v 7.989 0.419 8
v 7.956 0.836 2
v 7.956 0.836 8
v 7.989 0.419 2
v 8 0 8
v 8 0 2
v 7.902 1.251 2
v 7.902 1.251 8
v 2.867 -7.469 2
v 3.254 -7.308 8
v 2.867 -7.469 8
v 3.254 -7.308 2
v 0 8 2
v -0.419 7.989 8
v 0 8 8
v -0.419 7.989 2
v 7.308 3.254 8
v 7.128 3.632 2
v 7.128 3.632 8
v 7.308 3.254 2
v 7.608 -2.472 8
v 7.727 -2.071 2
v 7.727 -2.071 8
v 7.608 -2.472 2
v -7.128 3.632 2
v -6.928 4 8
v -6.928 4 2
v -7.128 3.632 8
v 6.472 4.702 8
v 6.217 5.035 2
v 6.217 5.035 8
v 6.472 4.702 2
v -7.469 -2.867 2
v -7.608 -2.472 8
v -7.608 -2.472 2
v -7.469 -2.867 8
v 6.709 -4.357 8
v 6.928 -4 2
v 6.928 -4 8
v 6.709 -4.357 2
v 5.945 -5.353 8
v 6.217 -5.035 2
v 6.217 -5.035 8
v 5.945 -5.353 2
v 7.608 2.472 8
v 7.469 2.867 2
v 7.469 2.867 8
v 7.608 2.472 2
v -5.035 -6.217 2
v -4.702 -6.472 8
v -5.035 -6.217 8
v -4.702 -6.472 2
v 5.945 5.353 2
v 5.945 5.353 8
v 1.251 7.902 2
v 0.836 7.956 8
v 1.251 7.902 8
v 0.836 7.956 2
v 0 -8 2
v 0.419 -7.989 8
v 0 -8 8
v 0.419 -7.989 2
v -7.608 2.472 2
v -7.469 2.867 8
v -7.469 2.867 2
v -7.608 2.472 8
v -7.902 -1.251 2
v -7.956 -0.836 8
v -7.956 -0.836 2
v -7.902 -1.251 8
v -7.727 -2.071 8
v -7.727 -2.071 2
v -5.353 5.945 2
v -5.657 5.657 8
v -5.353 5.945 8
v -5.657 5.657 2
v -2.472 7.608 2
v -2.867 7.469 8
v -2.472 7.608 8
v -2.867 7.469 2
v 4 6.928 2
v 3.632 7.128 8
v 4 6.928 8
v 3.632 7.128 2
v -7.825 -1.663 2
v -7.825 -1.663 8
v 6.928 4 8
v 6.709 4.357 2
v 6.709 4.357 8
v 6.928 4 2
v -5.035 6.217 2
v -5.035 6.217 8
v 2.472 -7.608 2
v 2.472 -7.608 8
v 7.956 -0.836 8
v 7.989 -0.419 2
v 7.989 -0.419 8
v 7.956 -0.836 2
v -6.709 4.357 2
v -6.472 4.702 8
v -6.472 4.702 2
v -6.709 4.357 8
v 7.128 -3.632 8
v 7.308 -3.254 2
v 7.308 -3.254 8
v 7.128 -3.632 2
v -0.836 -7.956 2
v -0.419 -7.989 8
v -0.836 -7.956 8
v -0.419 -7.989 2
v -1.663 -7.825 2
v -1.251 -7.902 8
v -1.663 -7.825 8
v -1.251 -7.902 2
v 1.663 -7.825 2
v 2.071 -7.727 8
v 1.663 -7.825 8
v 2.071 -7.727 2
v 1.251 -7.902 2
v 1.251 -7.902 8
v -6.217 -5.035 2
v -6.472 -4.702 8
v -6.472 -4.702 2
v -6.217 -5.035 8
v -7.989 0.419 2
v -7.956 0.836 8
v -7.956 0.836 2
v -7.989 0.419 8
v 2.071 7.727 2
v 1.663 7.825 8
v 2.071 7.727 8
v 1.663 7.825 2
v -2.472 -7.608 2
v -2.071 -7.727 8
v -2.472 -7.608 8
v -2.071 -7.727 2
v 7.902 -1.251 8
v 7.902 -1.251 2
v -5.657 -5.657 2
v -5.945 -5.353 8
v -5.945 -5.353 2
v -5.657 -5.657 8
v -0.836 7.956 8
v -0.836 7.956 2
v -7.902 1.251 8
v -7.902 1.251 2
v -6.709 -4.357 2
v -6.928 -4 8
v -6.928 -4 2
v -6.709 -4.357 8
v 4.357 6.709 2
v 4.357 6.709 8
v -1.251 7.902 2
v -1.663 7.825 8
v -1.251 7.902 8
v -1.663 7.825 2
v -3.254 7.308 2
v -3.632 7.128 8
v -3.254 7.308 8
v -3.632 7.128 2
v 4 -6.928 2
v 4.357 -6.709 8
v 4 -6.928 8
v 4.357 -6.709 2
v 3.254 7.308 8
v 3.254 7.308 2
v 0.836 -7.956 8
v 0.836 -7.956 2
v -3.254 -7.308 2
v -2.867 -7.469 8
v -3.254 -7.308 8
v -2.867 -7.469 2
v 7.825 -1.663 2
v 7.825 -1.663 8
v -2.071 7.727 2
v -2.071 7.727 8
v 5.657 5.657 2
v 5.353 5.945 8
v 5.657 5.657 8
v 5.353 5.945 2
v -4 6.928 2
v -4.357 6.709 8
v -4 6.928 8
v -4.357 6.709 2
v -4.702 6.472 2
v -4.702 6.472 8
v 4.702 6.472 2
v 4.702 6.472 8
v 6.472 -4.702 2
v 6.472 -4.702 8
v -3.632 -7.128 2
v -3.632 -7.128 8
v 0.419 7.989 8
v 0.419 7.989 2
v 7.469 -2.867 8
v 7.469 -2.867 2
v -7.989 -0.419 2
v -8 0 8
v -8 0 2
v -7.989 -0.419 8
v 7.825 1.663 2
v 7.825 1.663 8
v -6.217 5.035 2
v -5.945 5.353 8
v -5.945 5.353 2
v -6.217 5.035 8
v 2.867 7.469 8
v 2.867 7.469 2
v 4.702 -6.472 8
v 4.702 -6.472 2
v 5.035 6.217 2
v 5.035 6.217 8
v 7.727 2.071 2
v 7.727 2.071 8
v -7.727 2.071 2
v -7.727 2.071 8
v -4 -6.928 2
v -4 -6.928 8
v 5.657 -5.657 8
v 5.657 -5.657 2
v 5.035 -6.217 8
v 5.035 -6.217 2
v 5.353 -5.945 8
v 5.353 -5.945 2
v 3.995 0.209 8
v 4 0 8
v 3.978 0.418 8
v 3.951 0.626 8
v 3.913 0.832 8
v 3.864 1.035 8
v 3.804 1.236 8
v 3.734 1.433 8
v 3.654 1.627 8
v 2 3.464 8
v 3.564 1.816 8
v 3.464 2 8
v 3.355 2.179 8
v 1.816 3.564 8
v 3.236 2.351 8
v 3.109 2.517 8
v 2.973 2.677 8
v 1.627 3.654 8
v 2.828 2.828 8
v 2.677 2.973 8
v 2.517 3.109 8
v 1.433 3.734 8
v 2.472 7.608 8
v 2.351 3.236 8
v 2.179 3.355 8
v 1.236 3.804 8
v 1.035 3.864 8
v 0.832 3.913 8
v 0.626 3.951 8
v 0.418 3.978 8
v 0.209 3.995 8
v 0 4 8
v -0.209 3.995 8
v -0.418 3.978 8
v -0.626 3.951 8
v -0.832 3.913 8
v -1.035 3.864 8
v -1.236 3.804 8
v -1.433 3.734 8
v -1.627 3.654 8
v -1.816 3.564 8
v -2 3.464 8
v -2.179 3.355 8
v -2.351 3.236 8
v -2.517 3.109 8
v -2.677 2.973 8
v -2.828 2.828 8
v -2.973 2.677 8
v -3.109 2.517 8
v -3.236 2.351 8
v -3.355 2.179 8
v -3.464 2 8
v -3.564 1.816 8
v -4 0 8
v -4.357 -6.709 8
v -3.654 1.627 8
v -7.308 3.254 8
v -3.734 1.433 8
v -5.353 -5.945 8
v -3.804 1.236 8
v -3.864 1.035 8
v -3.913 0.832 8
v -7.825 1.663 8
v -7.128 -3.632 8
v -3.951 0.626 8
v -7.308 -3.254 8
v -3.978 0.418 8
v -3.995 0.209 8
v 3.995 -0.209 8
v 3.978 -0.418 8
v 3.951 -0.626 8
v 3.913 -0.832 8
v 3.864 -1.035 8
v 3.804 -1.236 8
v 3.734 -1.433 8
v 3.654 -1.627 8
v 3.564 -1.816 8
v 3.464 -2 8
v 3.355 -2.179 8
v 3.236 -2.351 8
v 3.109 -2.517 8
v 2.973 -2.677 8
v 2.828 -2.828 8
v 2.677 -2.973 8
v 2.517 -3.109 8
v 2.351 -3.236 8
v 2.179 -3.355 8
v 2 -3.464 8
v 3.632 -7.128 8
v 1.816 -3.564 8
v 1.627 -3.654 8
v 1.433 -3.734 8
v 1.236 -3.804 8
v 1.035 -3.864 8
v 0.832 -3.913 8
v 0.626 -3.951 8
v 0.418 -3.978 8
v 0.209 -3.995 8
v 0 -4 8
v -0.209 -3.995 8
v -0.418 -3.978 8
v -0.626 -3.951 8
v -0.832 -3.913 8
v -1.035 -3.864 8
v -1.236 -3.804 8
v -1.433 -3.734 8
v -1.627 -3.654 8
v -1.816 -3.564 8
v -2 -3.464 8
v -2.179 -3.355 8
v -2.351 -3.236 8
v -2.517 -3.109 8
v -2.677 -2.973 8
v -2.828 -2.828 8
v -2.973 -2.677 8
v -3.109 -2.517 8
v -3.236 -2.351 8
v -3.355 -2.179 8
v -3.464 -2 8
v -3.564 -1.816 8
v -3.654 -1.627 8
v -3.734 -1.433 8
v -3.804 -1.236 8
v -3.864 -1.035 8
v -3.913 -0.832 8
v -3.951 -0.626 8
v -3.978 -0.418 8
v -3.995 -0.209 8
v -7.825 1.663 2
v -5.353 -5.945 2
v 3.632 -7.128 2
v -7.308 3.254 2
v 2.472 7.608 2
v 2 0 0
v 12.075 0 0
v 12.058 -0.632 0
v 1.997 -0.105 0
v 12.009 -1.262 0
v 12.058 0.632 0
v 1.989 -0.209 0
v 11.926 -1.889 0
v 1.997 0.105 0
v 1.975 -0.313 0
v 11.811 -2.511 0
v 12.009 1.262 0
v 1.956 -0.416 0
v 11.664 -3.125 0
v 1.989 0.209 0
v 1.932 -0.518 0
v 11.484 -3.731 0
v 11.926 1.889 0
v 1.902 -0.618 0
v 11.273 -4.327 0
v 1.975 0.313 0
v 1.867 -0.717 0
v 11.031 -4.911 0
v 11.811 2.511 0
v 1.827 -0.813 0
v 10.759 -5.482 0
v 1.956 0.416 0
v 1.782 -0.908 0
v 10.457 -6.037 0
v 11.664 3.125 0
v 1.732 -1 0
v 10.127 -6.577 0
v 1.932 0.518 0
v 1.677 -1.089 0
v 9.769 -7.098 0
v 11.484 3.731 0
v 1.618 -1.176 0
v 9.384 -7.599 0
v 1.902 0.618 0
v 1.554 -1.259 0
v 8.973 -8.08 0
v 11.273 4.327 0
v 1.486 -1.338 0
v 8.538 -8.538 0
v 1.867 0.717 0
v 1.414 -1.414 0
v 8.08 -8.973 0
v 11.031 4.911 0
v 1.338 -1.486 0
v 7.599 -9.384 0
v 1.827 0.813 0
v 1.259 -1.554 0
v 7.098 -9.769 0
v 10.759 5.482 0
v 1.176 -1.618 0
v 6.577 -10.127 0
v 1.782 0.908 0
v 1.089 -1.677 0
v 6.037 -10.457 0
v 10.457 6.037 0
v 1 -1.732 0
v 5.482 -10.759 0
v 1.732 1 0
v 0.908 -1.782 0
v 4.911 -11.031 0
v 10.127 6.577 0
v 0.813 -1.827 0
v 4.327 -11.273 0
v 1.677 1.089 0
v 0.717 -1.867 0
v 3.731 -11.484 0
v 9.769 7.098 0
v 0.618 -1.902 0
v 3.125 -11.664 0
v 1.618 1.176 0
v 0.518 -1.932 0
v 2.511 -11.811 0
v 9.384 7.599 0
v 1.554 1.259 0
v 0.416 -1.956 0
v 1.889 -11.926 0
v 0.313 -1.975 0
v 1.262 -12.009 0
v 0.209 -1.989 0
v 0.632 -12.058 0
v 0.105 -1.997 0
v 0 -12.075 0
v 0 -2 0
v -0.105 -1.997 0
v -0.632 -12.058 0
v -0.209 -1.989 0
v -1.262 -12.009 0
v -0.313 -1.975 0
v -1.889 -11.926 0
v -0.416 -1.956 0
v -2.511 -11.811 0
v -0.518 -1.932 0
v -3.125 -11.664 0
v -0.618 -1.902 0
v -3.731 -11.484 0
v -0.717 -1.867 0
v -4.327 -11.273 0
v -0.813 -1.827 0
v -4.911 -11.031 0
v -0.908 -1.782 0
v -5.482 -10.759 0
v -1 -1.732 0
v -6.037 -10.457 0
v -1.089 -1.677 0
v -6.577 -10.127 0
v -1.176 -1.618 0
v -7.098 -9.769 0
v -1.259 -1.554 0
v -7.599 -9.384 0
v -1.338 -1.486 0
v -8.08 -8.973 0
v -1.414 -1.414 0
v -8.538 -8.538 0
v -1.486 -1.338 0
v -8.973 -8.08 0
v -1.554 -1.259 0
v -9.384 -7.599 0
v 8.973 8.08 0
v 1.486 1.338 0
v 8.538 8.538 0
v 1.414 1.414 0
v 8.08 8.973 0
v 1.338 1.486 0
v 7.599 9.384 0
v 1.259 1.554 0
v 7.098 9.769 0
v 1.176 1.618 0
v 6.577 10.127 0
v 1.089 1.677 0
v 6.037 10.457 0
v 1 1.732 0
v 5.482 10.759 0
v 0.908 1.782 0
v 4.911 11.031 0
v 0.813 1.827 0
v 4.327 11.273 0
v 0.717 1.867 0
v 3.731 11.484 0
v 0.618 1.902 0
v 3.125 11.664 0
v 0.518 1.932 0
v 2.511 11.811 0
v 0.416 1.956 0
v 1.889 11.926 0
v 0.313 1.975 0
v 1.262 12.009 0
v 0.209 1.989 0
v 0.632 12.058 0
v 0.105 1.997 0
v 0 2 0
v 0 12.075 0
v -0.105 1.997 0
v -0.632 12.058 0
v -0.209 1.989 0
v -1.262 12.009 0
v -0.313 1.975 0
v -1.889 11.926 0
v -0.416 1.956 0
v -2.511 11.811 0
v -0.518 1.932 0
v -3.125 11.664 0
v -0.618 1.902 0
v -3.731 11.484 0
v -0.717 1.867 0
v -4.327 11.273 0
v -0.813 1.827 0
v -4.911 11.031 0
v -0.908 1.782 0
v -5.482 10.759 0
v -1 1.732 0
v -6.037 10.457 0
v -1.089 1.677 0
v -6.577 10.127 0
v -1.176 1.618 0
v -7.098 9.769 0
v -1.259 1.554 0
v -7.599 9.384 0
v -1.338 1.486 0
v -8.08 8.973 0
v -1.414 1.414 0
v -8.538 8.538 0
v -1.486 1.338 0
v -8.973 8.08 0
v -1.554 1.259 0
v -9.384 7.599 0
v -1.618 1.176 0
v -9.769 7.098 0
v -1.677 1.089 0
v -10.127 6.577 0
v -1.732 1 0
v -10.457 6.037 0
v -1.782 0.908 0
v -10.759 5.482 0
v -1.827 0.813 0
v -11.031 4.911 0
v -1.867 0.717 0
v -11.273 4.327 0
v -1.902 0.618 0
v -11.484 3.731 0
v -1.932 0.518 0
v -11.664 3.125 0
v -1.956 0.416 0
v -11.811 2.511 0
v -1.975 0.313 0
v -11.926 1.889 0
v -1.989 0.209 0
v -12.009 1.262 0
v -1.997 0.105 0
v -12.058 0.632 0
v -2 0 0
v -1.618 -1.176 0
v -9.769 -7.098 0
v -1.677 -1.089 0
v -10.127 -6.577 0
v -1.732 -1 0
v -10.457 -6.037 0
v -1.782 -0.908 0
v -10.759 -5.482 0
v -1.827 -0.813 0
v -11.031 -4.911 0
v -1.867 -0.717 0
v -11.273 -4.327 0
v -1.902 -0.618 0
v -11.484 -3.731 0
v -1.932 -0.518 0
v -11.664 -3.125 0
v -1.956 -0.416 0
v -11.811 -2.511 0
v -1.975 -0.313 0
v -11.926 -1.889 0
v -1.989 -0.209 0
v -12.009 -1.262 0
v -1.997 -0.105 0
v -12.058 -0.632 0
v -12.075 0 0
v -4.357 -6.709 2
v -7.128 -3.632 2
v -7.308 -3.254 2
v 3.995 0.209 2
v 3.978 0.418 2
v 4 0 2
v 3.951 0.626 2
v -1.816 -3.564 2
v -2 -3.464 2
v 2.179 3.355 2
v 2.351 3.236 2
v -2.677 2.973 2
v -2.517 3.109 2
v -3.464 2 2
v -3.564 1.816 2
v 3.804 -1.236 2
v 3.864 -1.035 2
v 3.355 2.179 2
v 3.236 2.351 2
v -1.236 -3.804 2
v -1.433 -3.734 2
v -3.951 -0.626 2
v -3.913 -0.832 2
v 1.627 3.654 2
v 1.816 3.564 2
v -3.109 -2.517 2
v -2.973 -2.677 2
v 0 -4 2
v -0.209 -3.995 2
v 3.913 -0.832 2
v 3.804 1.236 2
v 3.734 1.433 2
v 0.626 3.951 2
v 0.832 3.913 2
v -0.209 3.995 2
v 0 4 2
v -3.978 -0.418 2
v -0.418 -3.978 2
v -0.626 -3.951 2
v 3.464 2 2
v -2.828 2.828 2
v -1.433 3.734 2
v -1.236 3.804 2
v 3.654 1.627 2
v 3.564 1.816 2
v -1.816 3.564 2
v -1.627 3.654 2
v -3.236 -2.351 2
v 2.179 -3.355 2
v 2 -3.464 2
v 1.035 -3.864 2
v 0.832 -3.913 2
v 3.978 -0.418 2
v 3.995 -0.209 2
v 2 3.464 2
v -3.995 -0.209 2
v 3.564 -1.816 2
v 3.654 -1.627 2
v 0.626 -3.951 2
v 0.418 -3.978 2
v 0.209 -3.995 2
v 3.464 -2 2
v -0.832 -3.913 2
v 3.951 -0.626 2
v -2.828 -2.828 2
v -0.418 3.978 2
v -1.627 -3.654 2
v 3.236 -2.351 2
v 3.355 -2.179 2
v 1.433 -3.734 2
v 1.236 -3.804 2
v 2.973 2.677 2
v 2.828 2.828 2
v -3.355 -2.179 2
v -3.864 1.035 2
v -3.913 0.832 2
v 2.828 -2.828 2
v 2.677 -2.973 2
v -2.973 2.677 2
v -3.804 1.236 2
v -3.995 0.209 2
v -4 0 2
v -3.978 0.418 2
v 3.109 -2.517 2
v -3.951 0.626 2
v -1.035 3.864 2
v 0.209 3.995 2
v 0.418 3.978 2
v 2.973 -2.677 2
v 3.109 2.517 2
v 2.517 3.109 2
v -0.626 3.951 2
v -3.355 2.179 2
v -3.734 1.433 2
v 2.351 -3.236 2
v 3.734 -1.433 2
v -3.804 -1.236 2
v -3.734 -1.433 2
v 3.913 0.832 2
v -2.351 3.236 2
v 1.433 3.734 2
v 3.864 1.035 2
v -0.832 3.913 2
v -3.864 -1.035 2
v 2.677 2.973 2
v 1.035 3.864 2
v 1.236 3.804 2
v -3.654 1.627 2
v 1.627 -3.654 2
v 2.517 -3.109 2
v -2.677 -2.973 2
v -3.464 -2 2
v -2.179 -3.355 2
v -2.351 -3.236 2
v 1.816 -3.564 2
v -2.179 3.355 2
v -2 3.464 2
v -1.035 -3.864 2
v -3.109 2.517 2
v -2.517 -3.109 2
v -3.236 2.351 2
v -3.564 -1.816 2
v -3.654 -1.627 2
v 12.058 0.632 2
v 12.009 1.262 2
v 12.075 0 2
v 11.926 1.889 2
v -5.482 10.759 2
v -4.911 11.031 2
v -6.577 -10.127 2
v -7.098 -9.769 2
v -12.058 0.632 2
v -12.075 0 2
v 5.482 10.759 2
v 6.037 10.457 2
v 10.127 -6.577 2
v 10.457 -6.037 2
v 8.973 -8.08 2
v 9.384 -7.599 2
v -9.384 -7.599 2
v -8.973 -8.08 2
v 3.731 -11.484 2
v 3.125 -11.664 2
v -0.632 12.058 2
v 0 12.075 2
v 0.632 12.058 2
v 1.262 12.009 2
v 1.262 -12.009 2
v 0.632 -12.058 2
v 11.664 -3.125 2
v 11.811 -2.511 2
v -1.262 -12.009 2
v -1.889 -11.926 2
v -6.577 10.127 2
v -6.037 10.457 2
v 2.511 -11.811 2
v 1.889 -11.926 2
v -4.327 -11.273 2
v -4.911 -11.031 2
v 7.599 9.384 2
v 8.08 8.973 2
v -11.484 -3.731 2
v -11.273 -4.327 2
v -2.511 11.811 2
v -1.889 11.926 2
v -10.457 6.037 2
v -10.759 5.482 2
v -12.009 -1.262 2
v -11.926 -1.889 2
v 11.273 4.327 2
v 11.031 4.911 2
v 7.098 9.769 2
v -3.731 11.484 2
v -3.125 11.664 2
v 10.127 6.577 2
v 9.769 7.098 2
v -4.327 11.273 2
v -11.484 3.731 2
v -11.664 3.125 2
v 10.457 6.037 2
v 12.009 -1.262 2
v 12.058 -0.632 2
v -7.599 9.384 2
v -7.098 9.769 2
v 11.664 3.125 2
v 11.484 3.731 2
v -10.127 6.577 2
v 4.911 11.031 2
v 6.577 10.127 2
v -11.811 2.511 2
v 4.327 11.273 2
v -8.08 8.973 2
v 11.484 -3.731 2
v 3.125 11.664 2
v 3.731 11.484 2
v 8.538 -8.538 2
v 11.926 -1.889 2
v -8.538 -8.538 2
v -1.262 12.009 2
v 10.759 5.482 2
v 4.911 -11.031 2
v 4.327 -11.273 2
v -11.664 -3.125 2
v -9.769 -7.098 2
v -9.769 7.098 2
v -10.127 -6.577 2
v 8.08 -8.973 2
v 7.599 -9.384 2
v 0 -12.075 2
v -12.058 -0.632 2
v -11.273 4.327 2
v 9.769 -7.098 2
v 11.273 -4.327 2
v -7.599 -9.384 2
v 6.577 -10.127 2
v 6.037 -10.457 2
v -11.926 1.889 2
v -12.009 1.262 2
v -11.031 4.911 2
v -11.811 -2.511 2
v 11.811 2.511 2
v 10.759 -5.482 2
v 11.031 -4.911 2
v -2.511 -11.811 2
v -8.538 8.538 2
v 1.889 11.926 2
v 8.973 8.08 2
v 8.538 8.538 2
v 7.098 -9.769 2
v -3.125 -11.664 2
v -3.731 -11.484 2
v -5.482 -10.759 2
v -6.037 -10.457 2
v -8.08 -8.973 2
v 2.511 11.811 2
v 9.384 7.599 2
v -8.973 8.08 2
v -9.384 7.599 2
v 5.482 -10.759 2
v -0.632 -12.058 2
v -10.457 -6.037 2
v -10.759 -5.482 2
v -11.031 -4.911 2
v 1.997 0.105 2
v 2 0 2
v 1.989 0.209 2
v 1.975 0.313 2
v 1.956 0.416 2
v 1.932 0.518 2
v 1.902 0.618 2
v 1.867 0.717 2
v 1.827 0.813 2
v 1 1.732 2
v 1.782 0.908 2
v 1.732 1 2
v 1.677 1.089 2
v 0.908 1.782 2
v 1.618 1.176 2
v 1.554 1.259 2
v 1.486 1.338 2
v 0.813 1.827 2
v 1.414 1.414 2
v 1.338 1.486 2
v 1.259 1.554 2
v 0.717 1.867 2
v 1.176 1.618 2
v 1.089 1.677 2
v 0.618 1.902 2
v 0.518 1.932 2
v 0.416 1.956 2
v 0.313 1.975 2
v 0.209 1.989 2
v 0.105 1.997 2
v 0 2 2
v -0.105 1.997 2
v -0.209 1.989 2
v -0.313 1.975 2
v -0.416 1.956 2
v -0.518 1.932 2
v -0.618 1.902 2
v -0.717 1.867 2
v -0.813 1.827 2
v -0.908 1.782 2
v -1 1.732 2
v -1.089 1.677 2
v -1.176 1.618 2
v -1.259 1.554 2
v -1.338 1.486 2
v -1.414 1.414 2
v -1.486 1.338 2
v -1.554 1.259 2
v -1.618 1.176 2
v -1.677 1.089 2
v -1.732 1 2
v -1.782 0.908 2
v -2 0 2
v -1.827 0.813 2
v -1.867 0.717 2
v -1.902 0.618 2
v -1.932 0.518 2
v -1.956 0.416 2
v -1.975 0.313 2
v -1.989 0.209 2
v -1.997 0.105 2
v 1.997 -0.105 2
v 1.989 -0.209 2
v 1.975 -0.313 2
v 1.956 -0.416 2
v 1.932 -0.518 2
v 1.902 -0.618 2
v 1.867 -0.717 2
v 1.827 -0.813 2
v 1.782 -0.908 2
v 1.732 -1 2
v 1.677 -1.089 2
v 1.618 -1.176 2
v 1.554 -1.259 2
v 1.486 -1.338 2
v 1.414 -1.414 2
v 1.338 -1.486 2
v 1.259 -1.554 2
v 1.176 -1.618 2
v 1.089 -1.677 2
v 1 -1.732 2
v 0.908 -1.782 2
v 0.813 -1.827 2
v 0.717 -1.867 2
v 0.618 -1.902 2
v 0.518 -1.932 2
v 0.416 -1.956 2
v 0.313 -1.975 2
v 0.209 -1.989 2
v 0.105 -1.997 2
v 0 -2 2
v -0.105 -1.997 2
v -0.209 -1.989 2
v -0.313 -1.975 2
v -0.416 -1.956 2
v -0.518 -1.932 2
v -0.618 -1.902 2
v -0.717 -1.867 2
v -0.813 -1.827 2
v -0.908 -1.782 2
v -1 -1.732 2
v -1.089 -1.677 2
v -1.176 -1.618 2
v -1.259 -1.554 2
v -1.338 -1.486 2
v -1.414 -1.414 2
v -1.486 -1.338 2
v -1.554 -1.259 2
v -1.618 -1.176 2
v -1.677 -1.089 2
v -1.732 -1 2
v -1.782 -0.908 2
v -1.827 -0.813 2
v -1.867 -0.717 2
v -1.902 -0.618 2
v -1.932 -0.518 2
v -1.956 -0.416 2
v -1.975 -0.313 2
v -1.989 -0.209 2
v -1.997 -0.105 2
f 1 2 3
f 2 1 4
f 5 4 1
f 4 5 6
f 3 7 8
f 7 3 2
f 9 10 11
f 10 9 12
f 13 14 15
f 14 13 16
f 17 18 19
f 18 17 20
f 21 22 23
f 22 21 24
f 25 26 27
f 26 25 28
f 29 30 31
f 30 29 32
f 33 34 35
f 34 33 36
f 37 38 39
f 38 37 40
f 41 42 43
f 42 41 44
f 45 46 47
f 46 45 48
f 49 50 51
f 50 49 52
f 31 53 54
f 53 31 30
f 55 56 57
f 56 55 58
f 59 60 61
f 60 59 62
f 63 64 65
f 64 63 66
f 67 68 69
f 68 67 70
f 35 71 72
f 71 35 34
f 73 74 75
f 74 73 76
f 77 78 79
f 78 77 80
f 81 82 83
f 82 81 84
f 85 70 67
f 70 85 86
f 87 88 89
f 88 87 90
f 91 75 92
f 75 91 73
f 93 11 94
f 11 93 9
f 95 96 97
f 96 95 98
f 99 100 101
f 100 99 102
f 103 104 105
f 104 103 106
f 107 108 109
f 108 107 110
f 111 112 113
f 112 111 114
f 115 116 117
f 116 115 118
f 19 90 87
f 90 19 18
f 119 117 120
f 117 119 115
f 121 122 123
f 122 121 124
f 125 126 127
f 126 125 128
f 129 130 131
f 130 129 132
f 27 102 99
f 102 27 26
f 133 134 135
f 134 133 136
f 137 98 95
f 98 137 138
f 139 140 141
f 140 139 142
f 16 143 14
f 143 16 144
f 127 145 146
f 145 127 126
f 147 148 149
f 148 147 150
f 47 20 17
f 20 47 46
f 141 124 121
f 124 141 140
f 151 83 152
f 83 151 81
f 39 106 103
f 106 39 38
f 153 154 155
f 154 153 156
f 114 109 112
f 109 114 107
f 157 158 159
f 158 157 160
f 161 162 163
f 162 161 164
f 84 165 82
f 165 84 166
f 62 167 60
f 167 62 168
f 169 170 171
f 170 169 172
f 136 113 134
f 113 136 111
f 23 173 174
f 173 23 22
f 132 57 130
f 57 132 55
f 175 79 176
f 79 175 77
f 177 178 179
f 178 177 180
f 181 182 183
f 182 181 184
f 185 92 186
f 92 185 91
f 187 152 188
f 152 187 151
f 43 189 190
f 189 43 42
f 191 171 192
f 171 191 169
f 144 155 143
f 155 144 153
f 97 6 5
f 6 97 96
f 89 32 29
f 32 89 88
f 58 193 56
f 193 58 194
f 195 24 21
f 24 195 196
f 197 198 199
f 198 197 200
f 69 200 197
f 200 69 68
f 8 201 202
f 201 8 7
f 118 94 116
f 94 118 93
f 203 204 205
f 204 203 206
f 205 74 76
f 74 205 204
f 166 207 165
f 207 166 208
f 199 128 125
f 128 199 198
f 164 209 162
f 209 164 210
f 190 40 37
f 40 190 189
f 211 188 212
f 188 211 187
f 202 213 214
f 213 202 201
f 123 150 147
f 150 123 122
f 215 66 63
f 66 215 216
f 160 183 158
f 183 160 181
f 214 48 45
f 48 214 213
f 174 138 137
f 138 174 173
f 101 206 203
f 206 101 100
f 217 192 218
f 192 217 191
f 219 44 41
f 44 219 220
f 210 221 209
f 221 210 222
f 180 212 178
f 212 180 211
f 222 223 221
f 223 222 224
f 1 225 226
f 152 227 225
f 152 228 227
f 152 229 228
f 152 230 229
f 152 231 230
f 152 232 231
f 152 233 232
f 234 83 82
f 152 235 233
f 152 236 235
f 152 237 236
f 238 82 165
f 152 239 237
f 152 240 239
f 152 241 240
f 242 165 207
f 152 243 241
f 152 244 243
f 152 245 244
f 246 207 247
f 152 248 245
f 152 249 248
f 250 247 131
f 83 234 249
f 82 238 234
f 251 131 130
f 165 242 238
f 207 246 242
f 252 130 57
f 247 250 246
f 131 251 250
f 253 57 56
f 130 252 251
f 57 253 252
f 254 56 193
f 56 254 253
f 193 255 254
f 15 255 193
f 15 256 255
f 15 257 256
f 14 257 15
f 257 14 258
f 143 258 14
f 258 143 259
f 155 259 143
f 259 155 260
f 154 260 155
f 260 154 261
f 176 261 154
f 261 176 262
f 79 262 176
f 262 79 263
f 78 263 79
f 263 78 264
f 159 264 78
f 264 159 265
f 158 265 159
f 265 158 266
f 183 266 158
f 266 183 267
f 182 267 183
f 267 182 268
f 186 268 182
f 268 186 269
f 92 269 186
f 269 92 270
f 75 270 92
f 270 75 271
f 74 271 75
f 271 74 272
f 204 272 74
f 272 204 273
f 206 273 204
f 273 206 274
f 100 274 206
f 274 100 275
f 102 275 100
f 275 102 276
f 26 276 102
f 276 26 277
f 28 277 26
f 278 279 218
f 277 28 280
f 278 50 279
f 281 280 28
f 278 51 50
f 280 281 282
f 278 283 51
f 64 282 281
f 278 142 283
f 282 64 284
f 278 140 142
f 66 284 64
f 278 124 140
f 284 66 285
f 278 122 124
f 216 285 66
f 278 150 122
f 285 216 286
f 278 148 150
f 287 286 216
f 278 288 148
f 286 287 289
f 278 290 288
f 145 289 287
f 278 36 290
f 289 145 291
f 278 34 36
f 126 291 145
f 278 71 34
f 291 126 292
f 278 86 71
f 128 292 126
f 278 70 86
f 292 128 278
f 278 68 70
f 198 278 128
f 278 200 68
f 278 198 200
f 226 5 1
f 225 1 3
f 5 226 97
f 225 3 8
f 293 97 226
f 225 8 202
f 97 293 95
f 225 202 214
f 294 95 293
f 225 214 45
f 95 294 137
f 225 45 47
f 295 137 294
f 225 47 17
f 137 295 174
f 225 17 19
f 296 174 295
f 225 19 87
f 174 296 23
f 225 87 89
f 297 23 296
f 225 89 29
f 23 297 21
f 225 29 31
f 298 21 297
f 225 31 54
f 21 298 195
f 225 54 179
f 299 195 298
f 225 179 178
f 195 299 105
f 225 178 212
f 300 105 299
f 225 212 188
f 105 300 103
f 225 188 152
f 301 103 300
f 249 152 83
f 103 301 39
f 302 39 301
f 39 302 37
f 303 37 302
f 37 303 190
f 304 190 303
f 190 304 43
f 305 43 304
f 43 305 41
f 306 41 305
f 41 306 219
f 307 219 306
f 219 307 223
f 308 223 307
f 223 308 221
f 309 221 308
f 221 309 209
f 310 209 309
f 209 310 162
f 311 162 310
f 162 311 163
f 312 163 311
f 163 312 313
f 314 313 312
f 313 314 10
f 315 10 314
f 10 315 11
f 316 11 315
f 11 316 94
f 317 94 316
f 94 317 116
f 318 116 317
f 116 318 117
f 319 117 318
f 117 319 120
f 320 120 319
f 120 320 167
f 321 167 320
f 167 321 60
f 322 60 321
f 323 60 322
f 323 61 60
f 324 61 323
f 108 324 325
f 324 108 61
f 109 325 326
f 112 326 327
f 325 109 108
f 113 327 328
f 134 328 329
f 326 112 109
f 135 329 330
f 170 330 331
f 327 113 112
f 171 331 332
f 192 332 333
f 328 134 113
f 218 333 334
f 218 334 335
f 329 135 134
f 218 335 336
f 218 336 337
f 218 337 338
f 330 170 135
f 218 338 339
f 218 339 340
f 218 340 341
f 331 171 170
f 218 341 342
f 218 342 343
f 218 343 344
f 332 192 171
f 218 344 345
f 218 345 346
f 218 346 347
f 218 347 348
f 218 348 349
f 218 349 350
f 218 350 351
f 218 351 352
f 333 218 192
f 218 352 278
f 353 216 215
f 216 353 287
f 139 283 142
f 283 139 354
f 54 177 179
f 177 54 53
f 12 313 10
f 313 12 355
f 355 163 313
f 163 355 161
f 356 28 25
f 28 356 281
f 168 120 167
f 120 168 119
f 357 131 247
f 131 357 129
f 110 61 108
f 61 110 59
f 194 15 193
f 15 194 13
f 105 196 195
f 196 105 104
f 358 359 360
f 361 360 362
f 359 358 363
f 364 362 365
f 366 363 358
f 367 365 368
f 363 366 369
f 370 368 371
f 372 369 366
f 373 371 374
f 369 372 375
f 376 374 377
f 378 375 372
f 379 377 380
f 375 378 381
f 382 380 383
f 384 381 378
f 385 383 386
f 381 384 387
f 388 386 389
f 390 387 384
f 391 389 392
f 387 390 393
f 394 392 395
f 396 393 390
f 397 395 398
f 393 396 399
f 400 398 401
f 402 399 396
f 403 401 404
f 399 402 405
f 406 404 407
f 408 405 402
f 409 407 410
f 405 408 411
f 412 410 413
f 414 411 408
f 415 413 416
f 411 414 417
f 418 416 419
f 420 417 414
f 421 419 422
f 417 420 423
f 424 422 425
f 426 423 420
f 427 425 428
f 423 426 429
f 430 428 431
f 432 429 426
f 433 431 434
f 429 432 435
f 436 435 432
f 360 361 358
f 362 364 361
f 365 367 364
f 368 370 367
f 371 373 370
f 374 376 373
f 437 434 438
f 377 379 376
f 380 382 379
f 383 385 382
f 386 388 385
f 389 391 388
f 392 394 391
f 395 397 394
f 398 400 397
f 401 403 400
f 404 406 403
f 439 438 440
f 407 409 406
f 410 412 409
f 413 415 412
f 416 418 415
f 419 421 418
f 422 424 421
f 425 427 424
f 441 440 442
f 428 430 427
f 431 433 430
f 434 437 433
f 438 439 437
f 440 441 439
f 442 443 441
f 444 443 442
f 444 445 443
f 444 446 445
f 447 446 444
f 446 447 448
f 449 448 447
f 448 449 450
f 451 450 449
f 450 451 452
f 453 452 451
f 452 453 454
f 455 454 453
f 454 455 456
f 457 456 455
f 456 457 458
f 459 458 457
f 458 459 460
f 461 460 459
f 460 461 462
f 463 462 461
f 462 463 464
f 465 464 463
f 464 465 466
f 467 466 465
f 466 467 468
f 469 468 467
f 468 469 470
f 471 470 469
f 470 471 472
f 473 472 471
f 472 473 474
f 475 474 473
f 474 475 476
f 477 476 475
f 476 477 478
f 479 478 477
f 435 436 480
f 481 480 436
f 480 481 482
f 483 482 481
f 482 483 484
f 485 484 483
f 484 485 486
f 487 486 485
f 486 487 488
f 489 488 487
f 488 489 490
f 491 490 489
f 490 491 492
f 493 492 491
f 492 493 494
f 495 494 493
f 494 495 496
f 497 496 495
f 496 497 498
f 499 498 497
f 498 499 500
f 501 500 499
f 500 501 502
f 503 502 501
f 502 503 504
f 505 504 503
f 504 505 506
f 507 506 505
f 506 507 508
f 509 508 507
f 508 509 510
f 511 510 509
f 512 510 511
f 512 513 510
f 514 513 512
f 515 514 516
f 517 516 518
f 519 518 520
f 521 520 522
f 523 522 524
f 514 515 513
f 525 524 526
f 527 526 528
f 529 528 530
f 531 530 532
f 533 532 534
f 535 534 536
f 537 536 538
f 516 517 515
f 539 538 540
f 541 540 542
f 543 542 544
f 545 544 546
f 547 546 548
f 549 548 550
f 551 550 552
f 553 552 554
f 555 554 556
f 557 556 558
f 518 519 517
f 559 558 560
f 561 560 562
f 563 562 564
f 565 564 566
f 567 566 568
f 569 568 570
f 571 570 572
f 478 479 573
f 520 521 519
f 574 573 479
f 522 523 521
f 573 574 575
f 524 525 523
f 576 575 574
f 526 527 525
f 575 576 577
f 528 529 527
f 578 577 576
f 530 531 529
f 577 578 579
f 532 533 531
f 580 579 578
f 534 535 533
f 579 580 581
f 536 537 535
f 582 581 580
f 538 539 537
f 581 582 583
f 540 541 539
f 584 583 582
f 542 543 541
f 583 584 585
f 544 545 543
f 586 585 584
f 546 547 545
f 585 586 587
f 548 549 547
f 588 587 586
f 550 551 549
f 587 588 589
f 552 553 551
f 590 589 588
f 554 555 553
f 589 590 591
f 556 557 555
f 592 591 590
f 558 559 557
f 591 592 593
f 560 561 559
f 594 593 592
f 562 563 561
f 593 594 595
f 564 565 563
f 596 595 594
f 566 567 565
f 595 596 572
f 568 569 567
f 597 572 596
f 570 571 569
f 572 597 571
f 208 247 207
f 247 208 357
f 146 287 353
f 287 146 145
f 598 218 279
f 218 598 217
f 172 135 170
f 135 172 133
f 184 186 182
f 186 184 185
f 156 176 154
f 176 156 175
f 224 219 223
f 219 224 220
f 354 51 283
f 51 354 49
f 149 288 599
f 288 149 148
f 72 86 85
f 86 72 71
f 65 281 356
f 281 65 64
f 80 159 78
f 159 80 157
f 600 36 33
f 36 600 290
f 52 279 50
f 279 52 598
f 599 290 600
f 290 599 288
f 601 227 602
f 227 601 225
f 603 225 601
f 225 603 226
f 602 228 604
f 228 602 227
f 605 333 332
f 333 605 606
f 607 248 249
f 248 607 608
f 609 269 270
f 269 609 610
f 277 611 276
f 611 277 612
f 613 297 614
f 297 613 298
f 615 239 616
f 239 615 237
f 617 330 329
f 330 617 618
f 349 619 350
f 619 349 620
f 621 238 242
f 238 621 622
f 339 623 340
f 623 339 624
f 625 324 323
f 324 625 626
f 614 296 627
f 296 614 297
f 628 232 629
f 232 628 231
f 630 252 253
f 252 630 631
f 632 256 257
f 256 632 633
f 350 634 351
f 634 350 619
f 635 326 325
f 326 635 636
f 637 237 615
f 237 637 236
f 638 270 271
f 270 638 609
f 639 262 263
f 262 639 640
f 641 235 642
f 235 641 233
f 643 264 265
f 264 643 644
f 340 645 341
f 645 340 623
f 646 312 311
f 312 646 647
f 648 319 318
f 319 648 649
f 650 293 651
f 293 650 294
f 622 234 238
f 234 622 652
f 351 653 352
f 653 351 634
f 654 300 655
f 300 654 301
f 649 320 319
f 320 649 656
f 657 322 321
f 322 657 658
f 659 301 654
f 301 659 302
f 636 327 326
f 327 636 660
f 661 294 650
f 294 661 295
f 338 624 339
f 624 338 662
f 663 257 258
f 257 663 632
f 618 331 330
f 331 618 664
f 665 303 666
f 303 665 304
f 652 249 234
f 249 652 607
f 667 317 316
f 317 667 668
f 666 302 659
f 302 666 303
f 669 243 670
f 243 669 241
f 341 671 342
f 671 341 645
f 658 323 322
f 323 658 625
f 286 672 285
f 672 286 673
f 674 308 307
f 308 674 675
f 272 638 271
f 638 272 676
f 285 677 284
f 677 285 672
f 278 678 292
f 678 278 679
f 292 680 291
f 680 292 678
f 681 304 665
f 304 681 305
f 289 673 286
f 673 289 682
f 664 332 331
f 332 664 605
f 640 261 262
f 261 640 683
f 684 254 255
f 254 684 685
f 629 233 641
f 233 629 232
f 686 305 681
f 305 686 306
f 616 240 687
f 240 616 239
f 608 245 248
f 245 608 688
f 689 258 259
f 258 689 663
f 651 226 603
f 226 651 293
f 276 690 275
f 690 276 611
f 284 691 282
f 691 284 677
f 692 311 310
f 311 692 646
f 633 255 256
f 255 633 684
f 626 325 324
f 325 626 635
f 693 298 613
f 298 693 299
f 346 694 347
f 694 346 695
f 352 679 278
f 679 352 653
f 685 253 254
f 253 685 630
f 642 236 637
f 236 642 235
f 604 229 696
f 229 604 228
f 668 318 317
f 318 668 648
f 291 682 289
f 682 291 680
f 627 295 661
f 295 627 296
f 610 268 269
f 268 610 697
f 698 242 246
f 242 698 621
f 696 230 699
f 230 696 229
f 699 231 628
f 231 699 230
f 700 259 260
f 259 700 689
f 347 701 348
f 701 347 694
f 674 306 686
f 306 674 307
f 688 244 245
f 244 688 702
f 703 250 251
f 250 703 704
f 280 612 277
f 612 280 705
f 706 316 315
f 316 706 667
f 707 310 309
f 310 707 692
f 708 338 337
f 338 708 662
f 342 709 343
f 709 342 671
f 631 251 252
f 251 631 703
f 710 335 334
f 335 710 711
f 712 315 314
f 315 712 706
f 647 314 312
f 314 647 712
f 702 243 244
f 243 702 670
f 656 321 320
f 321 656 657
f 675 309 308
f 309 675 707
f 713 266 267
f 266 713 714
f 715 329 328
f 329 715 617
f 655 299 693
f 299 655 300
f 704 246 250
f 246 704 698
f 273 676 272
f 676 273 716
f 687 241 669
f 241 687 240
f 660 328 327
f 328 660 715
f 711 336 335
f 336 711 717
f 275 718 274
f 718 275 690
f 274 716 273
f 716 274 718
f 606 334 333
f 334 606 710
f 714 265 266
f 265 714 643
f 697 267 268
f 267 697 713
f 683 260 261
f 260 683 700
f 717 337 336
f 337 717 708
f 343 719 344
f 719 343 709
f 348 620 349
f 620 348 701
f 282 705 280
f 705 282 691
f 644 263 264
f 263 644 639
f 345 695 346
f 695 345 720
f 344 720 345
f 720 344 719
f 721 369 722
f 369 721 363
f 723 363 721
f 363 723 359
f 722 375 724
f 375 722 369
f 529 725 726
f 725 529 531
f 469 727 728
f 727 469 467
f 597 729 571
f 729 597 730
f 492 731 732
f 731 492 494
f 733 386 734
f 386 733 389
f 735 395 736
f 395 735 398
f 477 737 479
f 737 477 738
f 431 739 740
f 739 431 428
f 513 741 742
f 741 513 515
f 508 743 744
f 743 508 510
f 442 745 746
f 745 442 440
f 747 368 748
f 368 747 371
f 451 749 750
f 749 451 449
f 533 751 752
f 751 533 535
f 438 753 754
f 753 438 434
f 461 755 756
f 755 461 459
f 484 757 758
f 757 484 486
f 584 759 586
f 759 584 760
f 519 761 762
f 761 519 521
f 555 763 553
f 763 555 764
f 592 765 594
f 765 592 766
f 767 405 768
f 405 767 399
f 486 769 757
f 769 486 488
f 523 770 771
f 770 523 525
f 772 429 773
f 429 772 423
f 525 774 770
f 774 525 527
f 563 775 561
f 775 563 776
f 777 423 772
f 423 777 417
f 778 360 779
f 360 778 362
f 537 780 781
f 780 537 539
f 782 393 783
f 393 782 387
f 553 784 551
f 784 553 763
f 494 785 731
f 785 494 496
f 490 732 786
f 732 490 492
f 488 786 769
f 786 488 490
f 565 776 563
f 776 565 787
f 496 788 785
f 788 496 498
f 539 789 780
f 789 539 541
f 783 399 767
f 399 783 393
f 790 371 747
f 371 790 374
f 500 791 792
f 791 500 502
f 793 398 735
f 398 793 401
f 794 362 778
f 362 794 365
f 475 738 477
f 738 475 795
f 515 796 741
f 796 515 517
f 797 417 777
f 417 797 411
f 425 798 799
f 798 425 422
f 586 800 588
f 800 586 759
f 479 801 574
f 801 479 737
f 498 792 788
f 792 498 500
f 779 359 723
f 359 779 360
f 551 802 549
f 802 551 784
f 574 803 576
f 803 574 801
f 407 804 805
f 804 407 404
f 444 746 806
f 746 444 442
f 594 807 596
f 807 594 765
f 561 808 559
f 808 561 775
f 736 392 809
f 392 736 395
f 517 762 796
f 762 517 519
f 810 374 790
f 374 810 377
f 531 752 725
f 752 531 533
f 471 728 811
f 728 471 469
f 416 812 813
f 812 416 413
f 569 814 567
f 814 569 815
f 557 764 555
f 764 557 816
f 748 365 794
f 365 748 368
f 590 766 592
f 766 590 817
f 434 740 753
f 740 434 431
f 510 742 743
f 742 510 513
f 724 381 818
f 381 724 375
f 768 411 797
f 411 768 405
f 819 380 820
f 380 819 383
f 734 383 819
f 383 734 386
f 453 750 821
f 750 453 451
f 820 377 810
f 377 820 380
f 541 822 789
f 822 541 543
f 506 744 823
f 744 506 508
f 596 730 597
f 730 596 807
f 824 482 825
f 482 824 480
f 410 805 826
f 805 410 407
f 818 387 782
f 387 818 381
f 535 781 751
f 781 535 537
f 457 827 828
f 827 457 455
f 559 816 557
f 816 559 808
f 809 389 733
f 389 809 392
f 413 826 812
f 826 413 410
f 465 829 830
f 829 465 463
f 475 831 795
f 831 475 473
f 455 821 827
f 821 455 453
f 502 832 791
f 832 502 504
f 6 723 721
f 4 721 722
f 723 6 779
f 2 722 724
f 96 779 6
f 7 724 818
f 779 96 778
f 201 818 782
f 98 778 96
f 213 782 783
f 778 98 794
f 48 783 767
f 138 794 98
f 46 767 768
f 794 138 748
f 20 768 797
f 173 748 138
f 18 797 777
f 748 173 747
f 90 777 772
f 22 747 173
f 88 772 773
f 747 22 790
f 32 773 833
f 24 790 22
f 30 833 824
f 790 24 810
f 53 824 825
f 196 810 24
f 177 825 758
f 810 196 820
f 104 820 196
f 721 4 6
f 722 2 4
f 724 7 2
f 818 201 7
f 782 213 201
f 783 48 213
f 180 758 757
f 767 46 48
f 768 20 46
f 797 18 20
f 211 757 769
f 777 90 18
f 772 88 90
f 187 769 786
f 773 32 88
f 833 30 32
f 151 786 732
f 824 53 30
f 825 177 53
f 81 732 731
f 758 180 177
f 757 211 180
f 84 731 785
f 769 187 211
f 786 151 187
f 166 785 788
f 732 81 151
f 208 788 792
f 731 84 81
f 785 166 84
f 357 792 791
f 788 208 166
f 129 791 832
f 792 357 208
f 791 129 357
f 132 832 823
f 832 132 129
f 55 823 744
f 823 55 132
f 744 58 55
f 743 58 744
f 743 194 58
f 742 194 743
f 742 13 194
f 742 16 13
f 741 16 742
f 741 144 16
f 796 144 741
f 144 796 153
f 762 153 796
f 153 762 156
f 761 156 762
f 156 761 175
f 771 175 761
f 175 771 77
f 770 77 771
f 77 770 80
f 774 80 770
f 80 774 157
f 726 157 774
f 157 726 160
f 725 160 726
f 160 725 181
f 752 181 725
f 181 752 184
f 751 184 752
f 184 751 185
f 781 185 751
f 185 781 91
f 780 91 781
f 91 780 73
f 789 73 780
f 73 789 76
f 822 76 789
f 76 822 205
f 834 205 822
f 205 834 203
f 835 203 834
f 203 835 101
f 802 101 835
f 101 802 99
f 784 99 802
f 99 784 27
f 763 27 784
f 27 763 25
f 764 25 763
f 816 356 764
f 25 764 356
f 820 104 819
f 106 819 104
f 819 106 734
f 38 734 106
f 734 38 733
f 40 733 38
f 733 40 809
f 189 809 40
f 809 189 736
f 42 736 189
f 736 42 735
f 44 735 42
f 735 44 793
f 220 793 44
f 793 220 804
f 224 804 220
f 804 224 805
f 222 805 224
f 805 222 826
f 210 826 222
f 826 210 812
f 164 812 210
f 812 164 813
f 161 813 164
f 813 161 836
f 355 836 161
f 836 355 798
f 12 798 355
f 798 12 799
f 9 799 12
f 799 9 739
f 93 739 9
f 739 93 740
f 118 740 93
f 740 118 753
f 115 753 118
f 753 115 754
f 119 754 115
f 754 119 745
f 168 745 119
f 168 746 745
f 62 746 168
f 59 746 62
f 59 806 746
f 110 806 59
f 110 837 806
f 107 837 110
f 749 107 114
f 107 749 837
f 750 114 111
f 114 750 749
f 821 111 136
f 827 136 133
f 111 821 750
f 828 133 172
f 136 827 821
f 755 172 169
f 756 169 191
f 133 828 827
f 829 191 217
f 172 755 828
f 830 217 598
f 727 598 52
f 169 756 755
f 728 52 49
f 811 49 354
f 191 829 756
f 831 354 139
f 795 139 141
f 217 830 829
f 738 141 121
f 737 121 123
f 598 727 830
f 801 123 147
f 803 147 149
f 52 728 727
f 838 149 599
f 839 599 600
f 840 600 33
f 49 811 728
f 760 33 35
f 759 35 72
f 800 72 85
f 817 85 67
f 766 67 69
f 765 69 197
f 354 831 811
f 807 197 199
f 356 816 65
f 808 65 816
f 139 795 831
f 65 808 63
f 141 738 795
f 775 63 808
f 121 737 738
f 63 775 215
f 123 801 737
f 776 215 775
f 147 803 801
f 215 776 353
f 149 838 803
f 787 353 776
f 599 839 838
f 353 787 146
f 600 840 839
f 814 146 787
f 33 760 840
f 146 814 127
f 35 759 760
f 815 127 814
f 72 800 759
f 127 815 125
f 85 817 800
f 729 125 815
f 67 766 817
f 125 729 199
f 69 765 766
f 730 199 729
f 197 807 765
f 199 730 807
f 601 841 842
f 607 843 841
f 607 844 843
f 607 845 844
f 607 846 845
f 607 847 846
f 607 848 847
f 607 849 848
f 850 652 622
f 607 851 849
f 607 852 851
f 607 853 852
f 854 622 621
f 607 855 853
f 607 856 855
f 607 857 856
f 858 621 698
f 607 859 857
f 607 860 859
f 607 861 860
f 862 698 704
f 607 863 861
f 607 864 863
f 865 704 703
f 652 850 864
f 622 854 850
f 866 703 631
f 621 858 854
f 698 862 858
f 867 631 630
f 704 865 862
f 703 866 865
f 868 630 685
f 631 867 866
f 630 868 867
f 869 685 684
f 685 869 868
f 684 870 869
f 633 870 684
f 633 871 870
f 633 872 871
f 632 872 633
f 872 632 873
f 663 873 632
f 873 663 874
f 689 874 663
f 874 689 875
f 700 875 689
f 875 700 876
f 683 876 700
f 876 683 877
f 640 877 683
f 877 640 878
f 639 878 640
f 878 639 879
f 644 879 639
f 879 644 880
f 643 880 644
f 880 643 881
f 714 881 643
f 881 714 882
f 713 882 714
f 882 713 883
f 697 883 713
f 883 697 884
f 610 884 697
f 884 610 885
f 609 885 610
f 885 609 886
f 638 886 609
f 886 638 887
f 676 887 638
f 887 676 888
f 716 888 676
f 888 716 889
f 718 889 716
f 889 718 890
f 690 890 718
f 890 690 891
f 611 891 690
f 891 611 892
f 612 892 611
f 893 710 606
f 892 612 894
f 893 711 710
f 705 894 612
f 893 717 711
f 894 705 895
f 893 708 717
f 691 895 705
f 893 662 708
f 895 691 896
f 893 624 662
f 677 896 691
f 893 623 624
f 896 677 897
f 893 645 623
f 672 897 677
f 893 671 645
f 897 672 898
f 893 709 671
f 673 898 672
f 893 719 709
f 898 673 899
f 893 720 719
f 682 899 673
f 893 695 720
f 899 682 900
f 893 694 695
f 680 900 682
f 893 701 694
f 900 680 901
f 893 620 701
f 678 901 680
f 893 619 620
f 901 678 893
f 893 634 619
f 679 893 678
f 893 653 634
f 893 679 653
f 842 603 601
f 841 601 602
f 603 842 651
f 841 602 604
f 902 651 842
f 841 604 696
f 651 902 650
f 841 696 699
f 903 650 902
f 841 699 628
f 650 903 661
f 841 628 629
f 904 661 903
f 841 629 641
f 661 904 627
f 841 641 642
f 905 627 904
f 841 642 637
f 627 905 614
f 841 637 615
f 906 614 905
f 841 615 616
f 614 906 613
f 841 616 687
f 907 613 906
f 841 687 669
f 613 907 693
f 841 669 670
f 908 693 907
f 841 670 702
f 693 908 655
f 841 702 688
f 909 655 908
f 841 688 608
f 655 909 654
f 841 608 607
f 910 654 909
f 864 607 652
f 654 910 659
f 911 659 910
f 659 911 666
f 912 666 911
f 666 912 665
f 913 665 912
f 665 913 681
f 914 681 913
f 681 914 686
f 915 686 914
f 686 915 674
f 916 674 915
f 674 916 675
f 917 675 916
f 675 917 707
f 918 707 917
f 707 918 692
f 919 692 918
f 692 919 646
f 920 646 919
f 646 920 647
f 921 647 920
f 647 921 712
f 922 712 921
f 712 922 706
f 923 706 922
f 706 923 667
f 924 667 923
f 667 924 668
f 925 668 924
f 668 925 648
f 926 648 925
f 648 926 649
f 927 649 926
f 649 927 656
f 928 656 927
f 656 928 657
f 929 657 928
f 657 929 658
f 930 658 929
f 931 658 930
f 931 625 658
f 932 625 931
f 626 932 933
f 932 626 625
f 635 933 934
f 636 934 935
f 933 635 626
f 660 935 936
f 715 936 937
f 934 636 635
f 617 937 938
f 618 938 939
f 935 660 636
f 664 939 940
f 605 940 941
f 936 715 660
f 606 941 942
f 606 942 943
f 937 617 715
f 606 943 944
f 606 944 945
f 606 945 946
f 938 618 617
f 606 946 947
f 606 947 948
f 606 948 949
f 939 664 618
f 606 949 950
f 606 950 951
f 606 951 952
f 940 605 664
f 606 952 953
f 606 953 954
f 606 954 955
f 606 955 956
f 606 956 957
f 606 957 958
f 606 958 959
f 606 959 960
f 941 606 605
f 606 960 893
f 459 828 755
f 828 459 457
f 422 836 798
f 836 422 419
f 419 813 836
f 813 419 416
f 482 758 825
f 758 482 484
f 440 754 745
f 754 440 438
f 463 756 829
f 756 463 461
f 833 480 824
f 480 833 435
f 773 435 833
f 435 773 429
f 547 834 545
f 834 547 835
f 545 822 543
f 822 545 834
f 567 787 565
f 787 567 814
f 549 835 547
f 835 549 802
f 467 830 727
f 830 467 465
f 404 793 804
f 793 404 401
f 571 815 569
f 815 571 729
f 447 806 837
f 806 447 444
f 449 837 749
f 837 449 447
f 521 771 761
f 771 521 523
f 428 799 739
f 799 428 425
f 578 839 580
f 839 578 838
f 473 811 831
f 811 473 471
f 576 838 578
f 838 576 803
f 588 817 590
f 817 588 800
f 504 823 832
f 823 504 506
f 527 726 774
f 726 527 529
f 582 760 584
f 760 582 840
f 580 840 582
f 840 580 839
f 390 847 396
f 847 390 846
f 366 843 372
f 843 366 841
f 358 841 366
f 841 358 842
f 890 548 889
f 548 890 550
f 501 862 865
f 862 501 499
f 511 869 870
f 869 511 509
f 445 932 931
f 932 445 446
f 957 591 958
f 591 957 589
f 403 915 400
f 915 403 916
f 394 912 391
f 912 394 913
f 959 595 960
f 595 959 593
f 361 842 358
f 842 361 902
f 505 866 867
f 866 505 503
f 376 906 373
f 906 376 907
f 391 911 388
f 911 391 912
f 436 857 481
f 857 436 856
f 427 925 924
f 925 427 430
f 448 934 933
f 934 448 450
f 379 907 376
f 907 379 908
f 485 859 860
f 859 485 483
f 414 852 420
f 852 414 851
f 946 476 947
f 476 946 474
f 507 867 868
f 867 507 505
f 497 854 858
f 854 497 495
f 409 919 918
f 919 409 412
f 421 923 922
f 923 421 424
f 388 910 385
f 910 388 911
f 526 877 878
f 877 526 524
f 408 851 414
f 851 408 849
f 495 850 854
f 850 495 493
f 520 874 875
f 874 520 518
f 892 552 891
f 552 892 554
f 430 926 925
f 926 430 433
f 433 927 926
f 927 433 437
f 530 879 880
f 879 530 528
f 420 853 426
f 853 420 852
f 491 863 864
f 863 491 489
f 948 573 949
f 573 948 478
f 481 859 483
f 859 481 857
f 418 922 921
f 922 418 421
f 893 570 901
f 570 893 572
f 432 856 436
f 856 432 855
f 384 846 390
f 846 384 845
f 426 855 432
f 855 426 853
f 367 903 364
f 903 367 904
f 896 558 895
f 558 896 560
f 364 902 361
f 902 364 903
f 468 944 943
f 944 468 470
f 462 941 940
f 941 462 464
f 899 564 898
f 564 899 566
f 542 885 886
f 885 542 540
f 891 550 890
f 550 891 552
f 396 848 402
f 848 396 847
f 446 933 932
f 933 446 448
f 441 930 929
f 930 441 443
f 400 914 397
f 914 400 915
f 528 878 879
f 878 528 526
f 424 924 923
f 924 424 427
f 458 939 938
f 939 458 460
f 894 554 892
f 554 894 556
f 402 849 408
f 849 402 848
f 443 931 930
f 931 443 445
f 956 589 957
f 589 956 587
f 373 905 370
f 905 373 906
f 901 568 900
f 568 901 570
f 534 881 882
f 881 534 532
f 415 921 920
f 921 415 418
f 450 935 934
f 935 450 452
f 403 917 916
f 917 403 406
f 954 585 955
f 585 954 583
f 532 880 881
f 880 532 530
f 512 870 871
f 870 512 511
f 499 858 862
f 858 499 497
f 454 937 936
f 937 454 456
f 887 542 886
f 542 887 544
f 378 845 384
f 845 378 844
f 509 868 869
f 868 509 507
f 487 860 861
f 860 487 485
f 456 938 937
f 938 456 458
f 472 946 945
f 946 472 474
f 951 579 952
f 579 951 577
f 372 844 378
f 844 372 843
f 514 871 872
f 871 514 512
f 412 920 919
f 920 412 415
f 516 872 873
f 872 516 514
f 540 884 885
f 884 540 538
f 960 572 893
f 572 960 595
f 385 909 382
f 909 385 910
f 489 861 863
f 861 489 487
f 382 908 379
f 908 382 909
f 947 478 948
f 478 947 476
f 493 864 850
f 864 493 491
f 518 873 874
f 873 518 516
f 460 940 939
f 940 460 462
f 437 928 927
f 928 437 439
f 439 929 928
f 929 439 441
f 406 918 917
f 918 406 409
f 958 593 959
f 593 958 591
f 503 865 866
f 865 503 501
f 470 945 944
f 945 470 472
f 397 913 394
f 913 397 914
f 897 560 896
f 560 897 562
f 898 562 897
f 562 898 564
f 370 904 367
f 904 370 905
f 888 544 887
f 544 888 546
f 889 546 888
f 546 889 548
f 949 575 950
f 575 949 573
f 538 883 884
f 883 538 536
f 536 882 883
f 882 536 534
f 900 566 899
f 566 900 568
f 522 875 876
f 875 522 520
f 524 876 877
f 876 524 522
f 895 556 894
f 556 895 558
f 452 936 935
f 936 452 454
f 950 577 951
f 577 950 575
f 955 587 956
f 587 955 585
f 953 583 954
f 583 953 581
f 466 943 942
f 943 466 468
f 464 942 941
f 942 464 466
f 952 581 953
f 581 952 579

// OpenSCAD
inner1 = 8;
outer1 = 16;
thickness1 = 8;

inner2 = 4;
outer2 = 24.15;
thickness2 = 2;

segments = 120;
module washer (inner, outer, thickness) {

    difference() {
        cylinder(d=outer, h=thickness, $fn=segments);
        translate([0,0,-thickness])
        cylinder(d=inner, h=thickness*3, $fn=segments);
    };
}

// dimensions in mm
union() {
    washer (inner1, outer1, thickness1);
    washer (inner2, outer2, thickness2);
}
